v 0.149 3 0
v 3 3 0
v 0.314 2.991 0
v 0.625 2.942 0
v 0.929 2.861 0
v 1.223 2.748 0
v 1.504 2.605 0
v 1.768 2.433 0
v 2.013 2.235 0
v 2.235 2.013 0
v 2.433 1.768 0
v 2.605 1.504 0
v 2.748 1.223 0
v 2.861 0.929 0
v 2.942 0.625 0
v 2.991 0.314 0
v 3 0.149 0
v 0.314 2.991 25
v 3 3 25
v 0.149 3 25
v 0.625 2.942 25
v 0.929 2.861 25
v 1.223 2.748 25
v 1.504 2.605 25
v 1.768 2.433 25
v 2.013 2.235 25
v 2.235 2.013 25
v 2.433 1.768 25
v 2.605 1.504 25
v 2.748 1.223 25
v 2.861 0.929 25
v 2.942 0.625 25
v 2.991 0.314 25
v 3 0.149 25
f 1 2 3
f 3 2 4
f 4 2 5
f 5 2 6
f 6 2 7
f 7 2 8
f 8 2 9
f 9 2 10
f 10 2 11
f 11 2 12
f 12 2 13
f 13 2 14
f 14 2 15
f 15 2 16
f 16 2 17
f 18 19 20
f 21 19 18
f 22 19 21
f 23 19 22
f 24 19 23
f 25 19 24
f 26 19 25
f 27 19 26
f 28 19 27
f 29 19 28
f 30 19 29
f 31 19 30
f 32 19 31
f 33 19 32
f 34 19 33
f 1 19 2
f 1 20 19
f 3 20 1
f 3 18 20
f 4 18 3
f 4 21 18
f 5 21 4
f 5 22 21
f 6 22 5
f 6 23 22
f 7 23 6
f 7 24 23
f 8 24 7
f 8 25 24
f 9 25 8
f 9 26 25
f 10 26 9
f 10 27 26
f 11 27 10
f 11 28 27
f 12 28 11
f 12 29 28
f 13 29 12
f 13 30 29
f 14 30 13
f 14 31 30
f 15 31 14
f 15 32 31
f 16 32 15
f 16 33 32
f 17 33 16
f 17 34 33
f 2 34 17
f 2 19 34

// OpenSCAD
// file: ../utils/core/clip.scad
//
// NopSCADlib Copyright Chris Palmer 2018
// nop.head@gmail.com
// hydraraptor.blogspot.com
//
// This file is part of NopSCADlib.
//
// NopSCADlib is free software: you can redistribute it and/or modify it under the terms of the
// GNU General Public License as published by the Free Software Foundation, either version 3 of
// the License, or (at your option) any later version.
//
// NopSCADlib is distributed in the hope that it will be useful, but WITHOUT ANY WARRANTY;
// without even the implied warranty of MERCHANTABILITY or FITNESS FOR A PARTICULAR PURPOSE.
// See the GNU General Public License for more details.
//
// You should have received a copy of the GNU General Public License along with NopSCADlib.
// If not, see <https://www.gnu.org/licenses/>.
//

//
//! Construct arbirarily large box to partition 3D space and clip objects, useful for creating cross sections to see the inside when debugging.
//!
//! Original version by Doug Moen on the OpenSCAD forum
//
//
module box(xmin, ymin, zmin, xmax, ymax, zmax) //! Construct a box given its bounds
    polyhedron(
        [[xmin, ymin, zmin],  // 0
         [xmin, ymin, zmax],  // 1
         [xmin, ymax, zmin],  // 2
         [xmin, ymax, zmax],  // 3
         [xmax, ymin, zmin],  // 4
         [xmax, ymin, zmax],  // 5
         [xmax, ymax, zmin],  // 6
         [xmax, ymax, zmax]], // 7
        [[7,5,1,3],  // top
         [2,0,4,6],  // bottom
         [5,4,0,1],  // front
         [3,2,6,7],  // back
         [5,7,6,4],  // right
         [0,2,3,1]]  // left
    );

module clip(xmin = -inf, ymin = -inf, zmin = -inf, xmax = inf, ymax = inf, zmax = inf) //! Clip child to specified boundaries
    render() intersection() {
        children();

        box(xmin, ymin, zmin, xmax, ymax, zmax);
    }
// file: ../utils/core/rounded_rectangle.scad
//
// NopSCADlib Copyright Chris Palmer 2018
// nop.head@gmail.com
// hydraraptor.blogspot.com
//
// This file is part of NopSCADlib.
//
// NopSCADlib is free software: you can redistribute it and/or modify it under the terms of the
// GNU General Public License as published by the Free Software Foundation, either version 3 of
// the License, or (at your option) any later version.
//
// NopSCADlib is distributed in the hope that it will be useful, but WITHOUT ANY WARRANTY;
// without even the implied warranty of MERCHANTABILITY or FITNESS FOR A PARTICULAR PURPOSE.
// See the GNU General Public License for more details.
//
// You should have received a copy of the GNU General Public License along with NopSCADlib.
// If not, see <https://www.gnu.org/licenses/>.
//

//
//! Rectangle with rounded corners.
//
module rounded_square(size, r, center = true) //! Like ```square()``` but with with rounded corners
{
    $fn = r2sides4n(r);
    offset(r) offset(-r) square(size, center = center);
}

module rounded_rectangle(size, r, center = true, xy_center = true) //! Like ```cube()``` but corners rounded in XY plane and separate centre options for xy and z.
{
    linear_extrude(height = size[2], center = center)
        rounded_square([size[0], size[1]], r, xy_center);
}
// file: ../utils/core/teardrops.scad
//
// NopSCADlib Copyright Chris Palmer 2018
// nop.head@gmail.com
// hydraraptor.blogspot.com
//
// This file is part of NopSCADlib.
//
// NopSCADlib is free software: you can redistribute it and/or modify it under the terms of the
// GNU General Public License as published by the Free Software Foundation, either version 3 of
// the License, or (at your option) any later version.
//
// NopSCADlib is distributed in the hope that it will be useful, but WITHOUT ANY WARRANTY;
// without even the implied warranty of MERCHANTABILITY or FITNESS FOR A PARTICULAR PURPOSE.
// See the GNU General Public License for more details.
//
// You should have received a copy of the GNU General Public License along with NopSCADlib.
// If not, see <https://www.gnu.org/licenses/>.
//

//
//! For making horizontal holes that don't need support material.
//! Small holes can get away without it, but they print better with truncated teardrops.
//
module teardrop(h, r, center = true, truncate = true) //! For making horizontal holes that don't need support material, set ```truncate = false``` to make traditional RepRap teardrops that don't even need bridging
    render(convexity = 5)
        extrude_if(h, center)
           hull() {
                circle4n(r);

                if(truncate)
                    translate([0, r / 2])
                        square([2 * r * (sqrt(2) - 1), r], center = true);
                else
                    polygon([[0, 0], [eps, 0], [0, r * sqrt(2)]]);
            }

module teardrop_plus(h, r, center = true, truncate = true) //! Slightly bigger teardrop to allow for the 3D printing staircase effect
    teardrop(h, r + layer_height / 4, center, truncate);

module tearslot(h, r, w, center = true) //! A horizontal slot that doesn't need support material
    extrude_if(h, center)
        hull() {
            translate([-w/2,0,0]) teardrop(r = r, h = 0);
            translate([ w/2,0,0]) teardrop(r = r, h = 0);
        }

module vertical_tearslot(h, r, l, center = true) //! A vertical slot that doesn't need support material
    extrude_if(h, center)
        hull() {
            translate([0,  l / 2]) teardrop(0, r, true);
            translate([0, -l / 2])
                circle4n(r);
        }
// file: ../utils/core/polyholes.scad
//
// NopSCADlib Copyright Chris Palmer 2018
// nop.head@gmail.com
// hydraraptor.blogspot.com
//
// This file is part of NopSCADlib.
//
// NopSCADlib is free software: you can redistribute it and/or modify it under the terms of the
// GNU General Public License as published by the Free Software Foundation, either version 3 of
// the License, or (at your option) any later version.
//
// NopSCADlib is distributed in the hope that it will be useful, but WITHOUT ANY WARRANTY;
// without even the implied warranty of MERCHANTABILITY or FITNESS FOR A PARTICULAR PURPOSE.
// See the GNU General Public License for more details.
//
// You should have received a copy of the GNU General Public License along with NopSCADlib.
// If not, see <https://www.gnu.org/licenses/>.
//

//
//! A method of making 3D printed holes come out the right size regardless of the printer, providing
//! it gets the linear dimensions right. See <https://hydraraptor.blogspot.com/2011/02/polyholes.html>
//!
//! The module provides `poly_circle()`, `poly_cylinder()` and `poly_ring()` that is useful for making printed washers and pillars.
//
function sides(r) = max(round(4 * r), 3); //! Optimium number of sides for specified radius
function corrected_radius(r, n = 0)   = r / cos(180 / (n ? n : sides(r))); //! Adjusted radius to make flats lie on the circle
function corrected_diameter(d, n = 0) = d / cos(180 / (n ? n : sides(d / 2))); //! Adjusted diameter to make flats lie on the circle

module poly_circle(r, sides = 0) { //! Make a circle adjusted to print the correct size
    n = sides ? sides : sides(r);
    circle(r = corrected_radius(r,n), $fn = n);
}

module poly_cylinder(r, h, center = false, sides = 0) //! Make a cylinder adjusted to print the correct size
    extrude_if(h, center)
        poly_circle(r, sides);

module poly_ring(or, ir) { //! Make a 2D ring adjusted to have the correct internal radius
    cir = corrected_radius(ir);
    filaments = floor((or - cir) / extrusion_width);
    if(filaments > 3)
        difference() {
            circle(or);

            poly_circle(ir);
        }
    else
        if(filaments >= 2)
            difference() {
                offset(or - cir)
                    poly_circle(ir);

                poly_circle(ir);
            }
            else
                difference() {
                    poly_circle(or);

                    offset(-squeezed_wall)
                        poly_circle(or);
                }
}

module drill(r, h = 100) //! Make a cylinder for drilling holes suitable for CNC routing, set h = 0 for circle
    extrude_if(h)
        circle(r = corrected_radius(r, r2sides(r)));
//
// Horizontal slot
//
module slot(r, l, h = 100) //! Make a horizontal slot suitable for CNC routing, set h = 0 for 2D version
    extrude_if(h)
        hull() {
            translate([l / 2,0])
                drill(r, 0);

            translate([-l / 2,0])
                drill(r, 0);
        }
// file: ../utils/core/bom.scad
//
// NopSCADlib Copyright Chris Palmer 2018
// nop.head@gmail.com
// hydraraptor.blogspot.com
//
// This file is part of NopSCADlib.
//
// NopSCADlib is free software: you can redistribute it and/or modify it under the terms of the
// GNU General Public License as published by the Free Software Foundation, either version 3 of
// the License, or (at your option) any later version.
//
// NopSCADlib is distributed in the hope that it will be useful, but WITHOUT ANY WARRANTY;
// without even the implied warranty of MERCHANTABILITY or FITNESS FOR A PARTICULAR PURPOSE.
// See the GNU General Public License for more details.
//
// You should have received a copy of the GNU General Public License along with NopSCADlib.
// If not, see <https://www.gnu.org/licenses/>.
//

//
//! Bill Of Materials generation via echo and the ```bom.py``` script. Also handles exploded assembly views and posing. Assembly instructions can precede the module
//! definition that makes the assembly.
//!
//! The example below shows how to define a vitamin and incorporate it into an assembly with sub-assemblies and make an exploded view. The resulting flat BOM is shown but
//! heirachical BOMs are also generated for real projects.
//
function bom_mode(n = 1) = $_bom >= n && (is_undef($on_bom) || $on_bom);  //! Current BOM mode, 0 = none, 1 = printed and routed parts and assemblies, 2 includes vitamins as well
function exploded() = is_undef($exploded_parent) ? $exploded : 0;   //! Returns the value of ```$exploded``` if it is defined, else ```0```
function show_supports() = !$preview || exploded();                 //! True if printed support material should be shown

module no_explode() let($exploded_parent = true) children();        //! Prevent children being exploded
module no_pose() let($posed = true) children();                     //! Force children not to be posed even if parent is

module explode(d, explode_children = false, offset = [0,0,0]) {     //! Explode children by specified Z distance or vector ```d```, option to explode grand children
    v = is_list(d) ? d : [0, 0, d];
    o = is_list(offset) ? offset : [0, 0, offset];
    if($exploded && is_undef($exploded_parent)) {
        translate(o)                                                // Draw the line first in case the child is transparent
            hull() {
                sphere(0.2);

                translate(v * $exploded)
                    sphere(0.2);
            }

        translate(v * $exploded)
            let($exploded_parent = explode_children ? undef : true)
                children();
    }
    else
        children();
}

module pose(a = [55, 0, 25], t = [0, 0, 0], exploded = undef)       //! Pose an STL or assembly for rendering to png by specifying rotation ```a``` and translation ```t```, ```exploded = true for``` just the exploded view or ```false``` for unexploded only.
    if(is_undef($pose) || !is_undef($posed) || (!is_undef(exploded) && exploded != !!exploded()))
        children();
    else
        let($posed = true) // only pose the top level
            rotate([55, 0, 25])
                rotate([-a.x, 0, 0])
                    rotate([0, -a.y, 0])
                        rotate([0, 0, -a.z])
                            translate(-t)
                                children();


module assembly(name) {                 //! Name an assembly that will appear on the BOM, there needs to a module named ```<name>_assembly``` to make it
    if(bom_mode())
        echo(str("~", name, "_assembly{"));

    no_pose()
        if(is_undef($child_assembly))
            let($child_assembly = true)
                children();
        else
            no_explode()
                children();

    if(bom_mode())
        echo(str("~}", name, "_assembly"));
}

module stl(name) {                      //! Name an stl that will appear on the BOM, there needs to a module named ```<name>_stl``` to make it
    if(bom_mode())
        echo(str("~", name, ".stl"));
}

module dxf(name) {                      //! Name a dxf that will appear on the BOM, there needs to a module named ```<name>_dxf``` to make it
    if(bom_mode())
        echo(str("~", name, ".dxf"));
}

function value_string(value) = is_string(value) ? str("\"", value, "\"") : str(value); //! Convert ```value``` to a string or quote it if it is already a string

function arg(value, default, name = "") =   //! Create string for arg if not default, helper for ```vitamin()```
    value == default ? ""
                     : name ? str(", ", name, " = ", value_string(value))
                            : str(", ", value_string(value));

module vitamin(description) {                //! Describe a vitamin for the BOM entry and precede it with a module call that creates it, eg. "wigit(42): Type 42 widget"
    if(bom_mode(2))
        echo(str("~", description, !is_undef($hidden) ? " - not shown" : ""));
}

module not_on_bom(on = false)               //! Specify the following child parts are not on the BOM, for example when they are on a PCB that comes assembled
    let($on_bom = on)
        children();

module hidden()                             //! Make item invisible, except on the BOM
    scale(1 / sqr(1024))
        let($hidden = true)
            children();
// file: ../utils/core/sphere.scad
//
// NopSCADlib Copyright Chris Palmer 2018
// nop.head@gmail.com
// hydraraptor.blogspot.com
//
// This file is part of NopSCADlib.
//
// NopSCADlib is free software: you can redistribute it and/or modify it under the terms of the
// GNU General Public License as published by the Free Software Foundation, either version 3 of
// the License, or (at your option) any later version.
//
// NopSCADlib is distributed in the hope that it will be useful, but WITHOUT ANY WARRANTY;
// without even the implied warranty of MERCHANTABILITY or FITNESS FOR A PARTICULAR PURPOSE.
// See the GNU General Public License for more details.
//
// You should have received a copy of the GNU General Public License along with NopSCADlib.
// If not, see <https://www.gnu.org/licenses/>.
//

//! Redefines `sphere()` to always have a vertex on all six half axes I.e. vertices at the poles and the equator and `$fn` a multiple of four.
//! This ensures `hull` and `minkowski` results have the correct dimensions when spheres are placed at the corners.

module sphere(r = 1, d = undef) {                   //! Override ```sphere``` so that has vertices on all three axes. Has the advantage of giving correct dimensions when hulled
    R = is_undef(d) ? r : d / 2;
    rotate_extrude($fn = r2sides4n(R))
        rotate(-90)
            semi_circle(R);
}
// file: ../utils/core/global.scad
//
// NopSCADlib Copyright Chris Palmer 2018
// nop.head@gmail.com
// hydraraptor.blogspot.com
//
// This file is part of NopSCADlib.
//
// NopSCADlib is free software: you can redistribute it and/or modify it under the terms of the
// GNU General Public License as published by the Free Software Foundation, either version 3 of
// the License, or (at your option) any later version.
//
// NopSCADlib is distributed in the hope that it will be useful, but WITHOUT ANY WARRANTY;
// without even the implied warranty of MERCHANTABILITY or FITNESS FOR A PARTICULAR PURPOSE.
// See the GNU General Public License for more details.
//
// You should have received a copy of the GNU General Public License along with NopSCADlib.
// If not, see <https://www.gnu.org/licenses/>.
//

//
//! Global constants, functions and modules. This file is used directly or indirectly in every scad file.
//
include <../../global_defs.scad>

function sqr(x) = x * x;                                                            //! Returns the square of ```x```
function inch(x) = x * 25.4;                                                        //! Inch to mm conversion
function echoit(x) = echo(x) x;                                                     //! Echo expression and return it, useful for debugging
function in(list, x) = !!len([for(v = list) if(v == x) true]);                      //! Returns true if ```x``` is an element in the ```list```
function Len(x) = is_list(x) ? len(x) : 0;                                          //! Returns the length of a list or 0 if ```x``` is not a list
function r2sides(r) = $fn ? $fn : ceil(max(min(360/ $fa, r * 2 * PI / $fs), 5));    //! Replicates the OpenSCAD logic to calculate the number of sides from the radius
function r2sides4n(r) = floor((r2sides(r) + 3) / 4) * 4;                            //! Round up the number of sides to a multiple of 4 to ensure points land on all axes

module translate_z(z) translate([0, 0, z]) children();                              //! Shortcut for Z only translations
module vflip() rotate([180, 0, 0]) children();                                      //! Invert children by doing a 180 flip around the X axis
module ellipse(xr, yr) scale([1, yr / xr]) circle4n(xr);                            //! Draw an ellipse

module extrude_if(h, center = true)                 //! Extrudes 2D object to 3D when ```h``` is nonzero, otherwise leaves it 2D
    if(h)
        linear_extrude(height = h, center = center) // 3D
            children();
    else
        children();                                 // 2D

module circle4n(r, d = undef) {                     //! Circle with multiple of 4 vertices
    R = is_undef(d) ? r : d / 2;
    circle(R, $fn = r2sides4n(R));
}

module semi_circle(r, d = undef)                    //! A semi circle in the positive Y domain
    intersection() {
        R = is_undef(d) ? r : d / 2;
        circle4n(R);

        sq = R + 1;
        translate([-sq, 0])
            square([2 * sq, sq]);
    }

include <sphere.scad>
include <bom.scad>
include <polyholes.scad>
include <teardrops.scad>
include <rounded_rectangle.scad>
include <clip.scad>
// file: ../core.scad
//
// NopSCADlib Copyright Chris Palmer 2018
// nop.head@gmail.com
// hydraraptor.blogspot.com
//
// This file is part of NopSCADlib.
//
// NopSCADlib is free software: you can redistribute it and/or modify it under the terms of the
// GNU General Public License as published by the Free Software Foundation, either version 3 of
// the License, or (at your option) any later version.
//
// NopSCADlib is distributed in the hope that it will be useful, but WITHOUT ANY WARRANTY;
// without even the implied warranty of MERCHANTABILITY or FITNESS FOR A PARTICULAR PURPOSE.
// See the GNU General Public License for more details.
//
// You should have received a copy of the GNU General Public License along with NopSCADlib.
// If not, see <https://www.gnu.org/licenses/>.
//

//
// Include this file to use the library
//
include <global_defs.scad>
//
// Global functions and modules
//
use <utils/core/global.scad>
// file: ../utils/fillet.scad
//
// NopSCADlib Copyright Chris Palmer 2018
// nop.head@gmail.com
// hydraraptor.blogspot.com
//
// This file is part of NopSCADlib.
//
// NopSCADlib is free software: you can redistribute it and/or modify it under the terms of the
// GNU General Public License as published by the Free Software Foundation, either version 3 of
// the License, or (at your option) any later version.
//
// NopSCADlib is distributed in the hope that it will be useful, but WITHOUT ANY WARRANTY;
// without even the implied warranty of MERCHANTABILITY or FITNESS FOR A PARTICULAR PURPOSE.
// See the GNU General Public License for more details.
//
// You should have received a copy of the GNU General Public License along with NopSCADlib.
// If not, see <https://www.gnu.org/licenses/>.
//

//
//! Rounded fillet for adding to corners.
//
include <../core.scad>

module fillet(r, h, center = false) //! Fillet with specified radius and height
    extrude_if(h, center = center)
        difference() {
            translate([-eps, -eps, 0])
                square(r + eps);

            circle(r + eps);
        }
// file: ../global_defs.scad
//
// NopSCADlib Copyright Chris Palmer 2018
// nop.head@gmail.com
// hydraraptor.blogspot.com
//
// This file is part of NopSCADlib.
//
// NopSCADlib is free software: you can redistribute it and/or modify it under the terms of the
// GNU General Public License as published by the Free Software Foundation, either version 3 of
// the License, or (at your option) any later version.
//
// NopSCADlib is distributed in the hope that it will be useful, but WITHOUT ANY WARRANTY;
// without even the implied warranty of MERCHANTABILITY or FITNESS FOR A PARTICULAR PURPOSE.
// See the GNU General Public License for more details.
//
// You should have received a copy of the GNU General Public License along with NopSCADlib.
// If not, see <https://www.gnu.org/licenses/>.
//

//
// This file included directly or indirectly in every scad file.
//
// This scheme allows the following:
//  bom defaults to 0
//  Setting $bom on the command line or in the main file before including lib.scad overrides it everywhere.
//  Setting $bom after including lib overrides bom in the libs but not in the local file.
//  Setting $_bom in the local file overrides it in the local file but not in the libs.
//
//function is_undef(x) = x == undef;

$_bom           = is_undef($bom)             ? 0      : $bom;             // 0 no bom, 1 assemblies and stls, 2 vitamins as well
$exploded       = is_undef($explode)         ? 0      : $explode;         // 1 for exploded view
layer_height    = is_undef($layer_height)    ? 0.25   : $layer_height;    // layer heigth when printing
extrusion_width = is_undef($extrusion_width) ? 0.5    : $extrusion_width; // filament width when printing
nozzle          = is_undef($nozzle)          ? 0.45   : $nozzle;          // 3D printer nozzle
cnc_bit_r       = is_undef($cnc_bit_r)       ? 1.2    : $cnc_bit_r;       // miniumum tool radius when milling 2D objects
pp1_colour      = is_undef($pp1_colour)      ? "lime" : $pp1_colour;      // printed part colour 1
pp2_colour      = is_undef($pp2_colour)      ? "red"  : $pp2_colour;      // printed part colour 2
pp3_colour      = is_undef($pp3_colour)      ? "blue" : $pp3_colour;      // printed part colour 3
pp4_colour      = is_undef($pp4_colour)      ? "darkorange" : $pp4_colour;// printed part colour 4
show_rays       = is_undef($show_rays)       ? false  : $show_rays;       // show camera sight lines and light direction

// Minimum wall is about two filaments wide but we extrude it closer to get better bonding
squeezed_wall = $preview ? 2 * extrusion_width - layer_height * (1 - PI / 4)
                         : extrusion_width - layer_height / 2 + nozzle / 2 + extrusion_width / 2;

inf = 1e10;      // very big
eps = 1/128;     // small fudge factor to stop CSG barfing on coincident faces.
$fa = 6;
$fs = extrusion_width / 2;

function round_to_layer(z) = ceil(z / layer_height) * layer_height;
// Some additional named colors
grey20                          = [0.2, 0.2, 0.2];
grey30                          = [0.3, 0.3, 0.3];
grey40                          = [0.4, 0.4, 0.4];
grey50                          = [0.5, 0.5, 0.5];
grey60                          = [0.6, 0.6, 0.6];
grey70                          = [0.7, 0.7, 0.7];
grey80                          = [0.8, 0.8, 0.8];
grey90                          = [0.9, 0.9, 0.9];
brass                           = "gold";

/*
 * Enums
 */
//
// Screws
//
hs_cap    = 0;
hs_pan    = 1;
hs_cs     = 2;     // counter sunk
hs_hex    = 3;
hs_grub   = 4;     // pulley set screw
hs_cs_cap = 5;
hs_dome   = 6;
//
// Hot end descriptions
//
jhead   = 1;
e3d     = 2;
//
// Face enumeration
//
f_bottom = 0;
f_top    = 1;
f_left   = 2;
f_right  = 3;
f_front  = 4;
f_back   = 5;
// main file
//
// NopSCADlib Copyright Chris Palmer 2018
// nop.head@gmail.com
// hydraraptor.blogspot.com
//
// This file is part of NopSCADlib.
//
// NopSCADlib is free software: you can redistribute it and/or modify it under the terms of the
// GNU General Public License as published by the Free Software Foundation, either version 3 of
// the License, or (at your option) any later version.
//
// NopSCADlib is distributed in the hope that it will be useful, but WITHOUT ANY WARRANTY;
// without even the implied warranty of MERCHANTABILITY or FITNESS FOR A PARTICULAR PURPOSE.
// See the GNU General Public License for more details.
//
// You should have received a copy of the GNU General Public License along with NopSCADlib.
// If not, see <https://www.gnu.org/licenses/>.
//
include <../global_defs.scad>
use <../utils/fillet.scad>

module fillets() {
    fillet(3, 25);
}

fillets();
